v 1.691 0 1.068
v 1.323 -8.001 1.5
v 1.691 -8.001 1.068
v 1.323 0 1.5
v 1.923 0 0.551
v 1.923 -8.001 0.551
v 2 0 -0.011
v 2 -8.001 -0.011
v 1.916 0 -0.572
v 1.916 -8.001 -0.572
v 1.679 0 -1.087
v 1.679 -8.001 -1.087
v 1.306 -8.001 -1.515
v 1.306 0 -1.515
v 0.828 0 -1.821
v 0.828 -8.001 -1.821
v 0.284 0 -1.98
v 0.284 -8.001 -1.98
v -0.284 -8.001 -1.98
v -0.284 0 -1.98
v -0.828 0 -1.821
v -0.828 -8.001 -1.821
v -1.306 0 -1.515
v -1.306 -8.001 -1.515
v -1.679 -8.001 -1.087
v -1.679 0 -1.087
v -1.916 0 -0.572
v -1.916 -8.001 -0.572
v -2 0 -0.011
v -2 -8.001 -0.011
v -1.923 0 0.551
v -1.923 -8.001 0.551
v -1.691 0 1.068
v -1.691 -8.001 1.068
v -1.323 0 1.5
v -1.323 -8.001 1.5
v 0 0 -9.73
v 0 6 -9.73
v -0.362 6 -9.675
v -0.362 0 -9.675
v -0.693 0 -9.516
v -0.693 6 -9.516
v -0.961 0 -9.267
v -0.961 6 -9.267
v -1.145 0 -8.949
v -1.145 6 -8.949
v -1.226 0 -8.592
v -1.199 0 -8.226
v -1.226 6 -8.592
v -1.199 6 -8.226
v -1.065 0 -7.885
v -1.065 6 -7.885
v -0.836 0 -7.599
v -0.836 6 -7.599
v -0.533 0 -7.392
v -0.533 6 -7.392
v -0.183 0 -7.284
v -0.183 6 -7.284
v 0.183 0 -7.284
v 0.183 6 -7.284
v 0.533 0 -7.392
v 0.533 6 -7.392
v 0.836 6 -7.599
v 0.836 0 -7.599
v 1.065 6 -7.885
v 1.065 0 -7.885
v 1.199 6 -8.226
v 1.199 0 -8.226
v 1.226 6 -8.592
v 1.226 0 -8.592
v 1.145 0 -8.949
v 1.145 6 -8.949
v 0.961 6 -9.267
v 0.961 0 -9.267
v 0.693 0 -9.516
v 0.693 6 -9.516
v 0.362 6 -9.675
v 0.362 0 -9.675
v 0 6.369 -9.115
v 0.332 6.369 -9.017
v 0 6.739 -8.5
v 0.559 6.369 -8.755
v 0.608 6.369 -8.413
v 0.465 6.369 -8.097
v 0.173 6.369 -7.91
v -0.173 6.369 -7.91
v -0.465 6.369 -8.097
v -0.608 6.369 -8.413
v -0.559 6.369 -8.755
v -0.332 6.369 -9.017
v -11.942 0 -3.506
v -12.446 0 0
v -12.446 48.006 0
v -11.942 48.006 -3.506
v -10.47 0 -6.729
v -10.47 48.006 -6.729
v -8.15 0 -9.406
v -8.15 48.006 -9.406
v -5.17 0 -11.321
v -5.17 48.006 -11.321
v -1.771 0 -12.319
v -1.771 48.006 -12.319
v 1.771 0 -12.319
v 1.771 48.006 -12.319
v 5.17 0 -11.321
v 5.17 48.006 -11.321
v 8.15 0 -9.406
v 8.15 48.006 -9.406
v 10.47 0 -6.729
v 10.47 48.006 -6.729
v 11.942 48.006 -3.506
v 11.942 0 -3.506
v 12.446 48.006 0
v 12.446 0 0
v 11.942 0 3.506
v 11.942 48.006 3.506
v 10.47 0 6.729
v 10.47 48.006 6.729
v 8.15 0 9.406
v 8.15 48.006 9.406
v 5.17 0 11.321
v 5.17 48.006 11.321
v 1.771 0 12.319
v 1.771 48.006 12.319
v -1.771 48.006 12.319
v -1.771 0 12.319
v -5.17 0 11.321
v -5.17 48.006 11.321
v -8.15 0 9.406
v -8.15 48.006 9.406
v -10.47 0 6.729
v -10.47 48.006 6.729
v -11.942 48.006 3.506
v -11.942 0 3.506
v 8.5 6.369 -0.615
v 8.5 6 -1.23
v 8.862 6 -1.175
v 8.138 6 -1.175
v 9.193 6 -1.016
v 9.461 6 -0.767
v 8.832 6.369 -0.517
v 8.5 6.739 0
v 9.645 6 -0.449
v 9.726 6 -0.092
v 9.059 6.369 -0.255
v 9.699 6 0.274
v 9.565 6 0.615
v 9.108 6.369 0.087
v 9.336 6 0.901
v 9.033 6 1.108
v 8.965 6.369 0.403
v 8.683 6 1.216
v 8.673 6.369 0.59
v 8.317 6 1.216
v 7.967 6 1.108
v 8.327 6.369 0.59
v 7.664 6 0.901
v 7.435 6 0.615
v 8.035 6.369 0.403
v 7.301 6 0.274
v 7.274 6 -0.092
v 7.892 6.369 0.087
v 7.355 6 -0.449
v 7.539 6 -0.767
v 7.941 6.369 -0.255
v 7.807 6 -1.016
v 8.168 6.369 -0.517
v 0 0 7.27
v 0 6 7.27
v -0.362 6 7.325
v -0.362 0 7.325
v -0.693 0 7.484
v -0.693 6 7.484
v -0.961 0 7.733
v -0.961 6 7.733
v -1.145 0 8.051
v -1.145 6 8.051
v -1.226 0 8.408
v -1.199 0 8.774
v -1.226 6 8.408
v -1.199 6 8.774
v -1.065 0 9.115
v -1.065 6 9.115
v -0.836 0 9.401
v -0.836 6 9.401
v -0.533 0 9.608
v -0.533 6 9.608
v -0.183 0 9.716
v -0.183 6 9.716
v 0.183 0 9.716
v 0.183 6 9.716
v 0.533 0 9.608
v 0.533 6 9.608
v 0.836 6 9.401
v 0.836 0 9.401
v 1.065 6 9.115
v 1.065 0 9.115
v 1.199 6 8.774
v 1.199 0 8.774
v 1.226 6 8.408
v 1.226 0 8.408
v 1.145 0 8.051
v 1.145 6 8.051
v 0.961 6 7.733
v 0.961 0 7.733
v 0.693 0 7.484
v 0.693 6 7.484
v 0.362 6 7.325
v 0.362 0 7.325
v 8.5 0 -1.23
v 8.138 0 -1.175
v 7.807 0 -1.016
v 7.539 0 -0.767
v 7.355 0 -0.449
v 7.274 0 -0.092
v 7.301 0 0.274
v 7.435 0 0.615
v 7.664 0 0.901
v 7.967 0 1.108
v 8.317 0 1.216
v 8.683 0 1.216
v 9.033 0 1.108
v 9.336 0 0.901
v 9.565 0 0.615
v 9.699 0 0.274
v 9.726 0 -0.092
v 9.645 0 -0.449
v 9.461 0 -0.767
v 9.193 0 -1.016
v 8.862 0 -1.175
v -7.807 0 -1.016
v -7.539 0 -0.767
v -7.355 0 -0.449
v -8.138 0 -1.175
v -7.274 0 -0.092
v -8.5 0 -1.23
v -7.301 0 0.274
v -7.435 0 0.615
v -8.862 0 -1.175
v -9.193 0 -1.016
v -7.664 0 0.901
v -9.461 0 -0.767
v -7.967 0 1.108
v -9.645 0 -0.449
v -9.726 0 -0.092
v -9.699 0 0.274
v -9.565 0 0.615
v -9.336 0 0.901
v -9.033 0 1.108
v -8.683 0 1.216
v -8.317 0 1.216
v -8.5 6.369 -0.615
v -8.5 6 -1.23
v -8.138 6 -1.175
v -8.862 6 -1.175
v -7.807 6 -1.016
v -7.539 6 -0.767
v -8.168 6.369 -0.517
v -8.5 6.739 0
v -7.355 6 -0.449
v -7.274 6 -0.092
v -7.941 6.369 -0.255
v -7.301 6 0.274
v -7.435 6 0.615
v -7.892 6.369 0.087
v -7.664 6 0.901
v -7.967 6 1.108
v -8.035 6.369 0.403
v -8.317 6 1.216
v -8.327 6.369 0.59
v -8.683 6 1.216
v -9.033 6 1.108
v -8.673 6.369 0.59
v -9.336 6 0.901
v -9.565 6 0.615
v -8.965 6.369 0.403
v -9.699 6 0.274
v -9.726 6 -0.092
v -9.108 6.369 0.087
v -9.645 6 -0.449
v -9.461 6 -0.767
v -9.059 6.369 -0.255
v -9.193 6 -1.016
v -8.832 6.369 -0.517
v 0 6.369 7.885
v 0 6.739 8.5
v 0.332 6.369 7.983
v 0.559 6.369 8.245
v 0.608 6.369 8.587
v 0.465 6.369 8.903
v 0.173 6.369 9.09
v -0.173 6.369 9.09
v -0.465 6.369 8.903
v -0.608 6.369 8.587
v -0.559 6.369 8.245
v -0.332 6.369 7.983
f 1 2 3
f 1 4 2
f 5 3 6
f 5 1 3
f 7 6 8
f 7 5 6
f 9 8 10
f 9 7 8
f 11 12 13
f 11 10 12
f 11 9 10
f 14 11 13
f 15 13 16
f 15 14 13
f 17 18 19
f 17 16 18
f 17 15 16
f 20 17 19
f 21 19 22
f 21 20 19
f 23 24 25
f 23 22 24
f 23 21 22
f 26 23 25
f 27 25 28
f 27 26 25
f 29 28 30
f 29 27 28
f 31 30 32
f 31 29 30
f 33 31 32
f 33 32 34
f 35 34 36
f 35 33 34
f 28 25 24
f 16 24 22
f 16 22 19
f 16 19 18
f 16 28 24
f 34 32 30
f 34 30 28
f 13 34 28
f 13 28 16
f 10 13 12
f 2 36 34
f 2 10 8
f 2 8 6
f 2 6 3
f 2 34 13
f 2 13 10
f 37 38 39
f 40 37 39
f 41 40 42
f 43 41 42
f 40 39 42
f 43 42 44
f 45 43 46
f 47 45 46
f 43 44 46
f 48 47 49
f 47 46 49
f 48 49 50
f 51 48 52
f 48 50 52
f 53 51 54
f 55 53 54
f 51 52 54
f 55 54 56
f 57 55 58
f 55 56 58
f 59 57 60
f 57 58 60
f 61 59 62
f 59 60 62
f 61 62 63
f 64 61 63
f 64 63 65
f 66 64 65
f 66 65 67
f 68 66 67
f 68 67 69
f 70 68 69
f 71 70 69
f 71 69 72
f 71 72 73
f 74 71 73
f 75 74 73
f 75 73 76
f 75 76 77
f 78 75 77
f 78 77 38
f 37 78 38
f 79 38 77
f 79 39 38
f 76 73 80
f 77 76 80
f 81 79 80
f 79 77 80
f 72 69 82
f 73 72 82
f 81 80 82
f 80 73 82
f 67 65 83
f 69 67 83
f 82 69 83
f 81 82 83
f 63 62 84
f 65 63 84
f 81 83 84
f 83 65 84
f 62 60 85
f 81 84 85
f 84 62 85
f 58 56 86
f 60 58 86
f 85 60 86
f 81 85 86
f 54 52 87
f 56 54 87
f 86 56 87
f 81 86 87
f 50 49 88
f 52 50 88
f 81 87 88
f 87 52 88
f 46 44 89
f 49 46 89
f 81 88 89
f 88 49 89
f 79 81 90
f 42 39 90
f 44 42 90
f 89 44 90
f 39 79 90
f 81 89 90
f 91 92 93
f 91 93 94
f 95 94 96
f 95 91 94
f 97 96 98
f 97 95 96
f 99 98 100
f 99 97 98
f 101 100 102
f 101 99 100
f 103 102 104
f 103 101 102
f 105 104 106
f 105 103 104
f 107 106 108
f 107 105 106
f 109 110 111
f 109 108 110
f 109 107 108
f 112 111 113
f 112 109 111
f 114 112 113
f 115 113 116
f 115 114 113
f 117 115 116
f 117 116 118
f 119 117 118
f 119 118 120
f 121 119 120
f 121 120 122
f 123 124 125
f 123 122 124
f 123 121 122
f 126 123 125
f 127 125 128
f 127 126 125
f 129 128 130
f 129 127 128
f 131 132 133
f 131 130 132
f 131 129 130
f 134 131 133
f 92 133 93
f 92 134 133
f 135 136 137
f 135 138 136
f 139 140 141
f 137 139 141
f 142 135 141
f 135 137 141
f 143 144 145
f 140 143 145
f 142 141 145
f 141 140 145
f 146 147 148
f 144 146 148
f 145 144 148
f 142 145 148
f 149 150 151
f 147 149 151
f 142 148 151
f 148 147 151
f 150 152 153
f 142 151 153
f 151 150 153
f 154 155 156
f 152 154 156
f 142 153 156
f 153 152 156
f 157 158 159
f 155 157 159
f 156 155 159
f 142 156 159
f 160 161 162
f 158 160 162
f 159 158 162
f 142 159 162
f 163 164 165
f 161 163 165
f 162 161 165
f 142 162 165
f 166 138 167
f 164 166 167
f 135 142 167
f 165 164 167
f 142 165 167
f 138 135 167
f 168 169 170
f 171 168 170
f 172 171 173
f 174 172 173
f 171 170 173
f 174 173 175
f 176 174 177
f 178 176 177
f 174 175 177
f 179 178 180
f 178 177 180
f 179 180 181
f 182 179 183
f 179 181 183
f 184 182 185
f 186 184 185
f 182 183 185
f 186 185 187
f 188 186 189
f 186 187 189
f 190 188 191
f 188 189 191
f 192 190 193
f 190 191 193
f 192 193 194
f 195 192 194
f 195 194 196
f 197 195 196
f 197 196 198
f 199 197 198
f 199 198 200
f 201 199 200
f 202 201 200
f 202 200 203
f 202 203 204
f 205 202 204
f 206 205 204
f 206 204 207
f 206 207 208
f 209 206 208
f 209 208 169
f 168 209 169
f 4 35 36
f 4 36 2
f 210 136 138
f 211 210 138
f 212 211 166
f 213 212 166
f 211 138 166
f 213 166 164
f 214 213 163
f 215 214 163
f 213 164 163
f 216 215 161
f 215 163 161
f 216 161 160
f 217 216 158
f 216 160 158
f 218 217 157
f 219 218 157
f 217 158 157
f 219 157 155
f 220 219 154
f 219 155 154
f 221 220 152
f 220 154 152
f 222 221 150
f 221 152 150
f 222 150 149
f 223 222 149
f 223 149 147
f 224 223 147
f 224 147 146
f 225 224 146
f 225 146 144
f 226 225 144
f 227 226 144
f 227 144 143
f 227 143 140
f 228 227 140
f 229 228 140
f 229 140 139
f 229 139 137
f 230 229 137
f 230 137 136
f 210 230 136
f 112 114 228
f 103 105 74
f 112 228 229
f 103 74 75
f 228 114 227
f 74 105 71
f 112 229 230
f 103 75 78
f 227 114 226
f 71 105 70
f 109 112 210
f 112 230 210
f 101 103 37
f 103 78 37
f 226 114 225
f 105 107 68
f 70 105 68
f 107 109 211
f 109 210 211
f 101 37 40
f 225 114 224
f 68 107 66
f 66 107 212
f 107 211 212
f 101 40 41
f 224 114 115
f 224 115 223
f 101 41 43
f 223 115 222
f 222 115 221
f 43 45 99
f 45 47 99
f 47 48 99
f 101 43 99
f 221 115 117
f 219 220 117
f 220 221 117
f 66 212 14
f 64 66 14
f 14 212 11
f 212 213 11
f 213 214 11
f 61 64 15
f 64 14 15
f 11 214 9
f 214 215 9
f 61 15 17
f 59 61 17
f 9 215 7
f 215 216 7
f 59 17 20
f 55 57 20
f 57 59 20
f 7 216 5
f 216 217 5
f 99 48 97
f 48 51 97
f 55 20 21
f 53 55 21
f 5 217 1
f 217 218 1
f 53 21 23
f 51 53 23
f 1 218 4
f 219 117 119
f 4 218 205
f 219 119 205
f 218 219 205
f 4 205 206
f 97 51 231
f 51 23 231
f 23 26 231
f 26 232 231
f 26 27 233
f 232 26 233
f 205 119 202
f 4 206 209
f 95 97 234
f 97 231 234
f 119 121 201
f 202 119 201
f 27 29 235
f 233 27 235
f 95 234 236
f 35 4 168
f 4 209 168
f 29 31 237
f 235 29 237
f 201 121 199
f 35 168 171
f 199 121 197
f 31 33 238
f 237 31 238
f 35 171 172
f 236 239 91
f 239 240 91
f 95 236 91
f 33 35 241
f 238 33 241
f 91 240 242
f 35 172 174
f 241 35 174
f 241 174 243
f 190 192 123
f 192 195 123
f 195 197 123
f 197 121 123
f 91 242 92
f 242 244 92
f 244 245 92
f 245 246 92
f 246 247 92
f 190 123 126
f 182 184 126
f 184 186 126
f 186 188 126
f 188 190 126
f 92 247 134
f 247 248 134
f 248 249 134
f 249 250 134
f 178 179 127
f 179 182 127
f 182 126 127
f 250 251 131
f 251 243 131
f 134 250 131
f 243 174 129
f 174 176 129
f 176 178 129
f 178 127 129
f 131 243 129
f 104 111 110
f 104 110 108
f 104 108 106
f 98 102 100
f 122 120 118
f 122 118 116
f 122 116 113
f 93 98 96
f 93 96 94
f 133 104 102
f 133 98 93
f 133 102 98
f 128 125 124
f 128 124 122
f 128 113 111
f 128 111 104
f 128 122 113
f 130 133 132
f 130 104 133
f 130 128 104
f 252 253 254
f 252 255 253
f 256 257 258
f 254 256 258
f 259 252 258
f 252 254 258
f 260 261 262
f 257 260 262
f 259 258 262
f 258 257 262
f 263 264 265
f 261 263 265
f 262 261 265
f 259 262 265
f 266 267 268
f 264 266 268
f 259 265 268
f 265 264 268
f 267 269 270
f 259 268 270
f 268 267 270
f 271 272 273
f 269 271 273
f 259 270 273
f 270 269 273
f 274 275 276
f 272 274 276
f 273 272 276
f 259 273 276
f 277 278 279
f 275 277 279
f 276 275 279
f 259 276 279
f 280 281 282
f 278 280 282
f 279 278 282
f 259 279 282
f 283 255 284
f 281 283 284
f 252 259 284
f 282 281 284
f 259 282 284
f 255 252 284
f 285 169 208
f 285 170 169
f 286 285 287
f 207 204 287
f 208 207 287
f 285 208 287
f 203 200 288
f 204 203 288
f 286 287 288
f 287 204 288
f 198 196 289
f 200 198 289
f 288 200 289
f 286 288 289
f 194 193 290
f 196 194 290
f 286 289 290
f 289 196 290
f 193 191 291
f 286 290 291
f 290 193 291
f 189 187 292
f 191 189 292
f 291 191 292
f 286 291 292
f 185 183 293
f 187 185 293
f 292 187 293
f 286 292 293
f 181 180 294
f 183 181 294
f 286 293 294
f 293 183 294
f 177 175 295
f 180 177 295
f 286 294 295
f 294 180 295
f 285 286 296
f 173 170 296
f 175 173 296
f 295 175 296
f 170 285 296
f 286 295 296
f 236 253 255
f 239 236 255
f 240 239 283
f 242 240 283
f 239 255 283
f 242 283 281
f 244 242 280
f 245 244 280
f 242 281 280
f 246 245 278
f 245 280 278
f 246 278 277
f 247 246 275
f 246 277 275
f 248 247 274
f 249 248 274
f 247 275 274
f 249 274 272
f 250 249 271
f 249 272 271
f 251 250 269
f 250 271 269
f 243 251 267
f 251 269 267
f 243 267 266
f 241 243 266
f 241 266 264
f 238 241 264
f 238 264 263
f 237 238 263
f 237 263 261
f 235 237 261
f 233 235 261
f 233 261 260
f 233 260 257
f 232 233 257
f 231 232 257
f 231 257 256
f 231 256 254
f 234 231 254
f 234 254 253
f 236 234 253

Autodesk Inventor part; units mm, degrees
ref_plane "YZ Plane" through (0, 0, 0) normal (1, 0, 0) x (0, 1, 0)
ref_plane "XZ Plane" through (0, 0, 0) normal (0, 1, 0) x (-1, 0, 0)
ref_plane "XY Plane" through (0, 0, 0) normal (0, 0, 1) x (1, 0, 0)
sketch "Boceto1" plane through (0, 0, 0) normal (0, 1, 0) x (-1, 0, 0)
  circle A0 centre (0, 0) radius 12.446
  dimension "d0" = 24.892
extrude "Extrusión1" add sketch "Boceto1" along normal blind 48.006
sketch "Boceto2" plane through (0, 0, 0) normal (0, -1, 0) x (1, 0, 0)
  arc A0 (-1.3229, 1.5) -> (1.3229, 1.5) centre (0, 0) ccw
  line L0 (-1.3229, 1.5) -> (1.3229, 1.5)
  dimension "d3" = 4
  dimension "d4" = 1.5
extrude "Extrusión2" add sketch "Boceto2" along normal blind 8.001
sketch "Boceto3" plane through (0, 0, 0) normal (0, -1, 0) x (1, 0, 0)
  arc A0 (-1.3229, 1.5) -> (1.3229, 1.5) centre (0, 0) ccw projected
  point P0 (0, 8.5)
  point P1 (-8.5, 0)
  point P2 (0, -8.5)
  point P3 (8.5, 0)
  dimension "d7" = 8.5
  dimension "d10" = 360
hole "Hole1" at (0, 0, 8.5) at (-8.5, 0, 0) at (0, 0, -8.5) at (8.5, 0, 0) direction (0, 1, 0) diameter 2.459 depth 6 tip angle 118 thread size "M3x0.5" class "6H" standard "ISO Metric profile"
properties part number "Motor" material "Aluminio-6061"
